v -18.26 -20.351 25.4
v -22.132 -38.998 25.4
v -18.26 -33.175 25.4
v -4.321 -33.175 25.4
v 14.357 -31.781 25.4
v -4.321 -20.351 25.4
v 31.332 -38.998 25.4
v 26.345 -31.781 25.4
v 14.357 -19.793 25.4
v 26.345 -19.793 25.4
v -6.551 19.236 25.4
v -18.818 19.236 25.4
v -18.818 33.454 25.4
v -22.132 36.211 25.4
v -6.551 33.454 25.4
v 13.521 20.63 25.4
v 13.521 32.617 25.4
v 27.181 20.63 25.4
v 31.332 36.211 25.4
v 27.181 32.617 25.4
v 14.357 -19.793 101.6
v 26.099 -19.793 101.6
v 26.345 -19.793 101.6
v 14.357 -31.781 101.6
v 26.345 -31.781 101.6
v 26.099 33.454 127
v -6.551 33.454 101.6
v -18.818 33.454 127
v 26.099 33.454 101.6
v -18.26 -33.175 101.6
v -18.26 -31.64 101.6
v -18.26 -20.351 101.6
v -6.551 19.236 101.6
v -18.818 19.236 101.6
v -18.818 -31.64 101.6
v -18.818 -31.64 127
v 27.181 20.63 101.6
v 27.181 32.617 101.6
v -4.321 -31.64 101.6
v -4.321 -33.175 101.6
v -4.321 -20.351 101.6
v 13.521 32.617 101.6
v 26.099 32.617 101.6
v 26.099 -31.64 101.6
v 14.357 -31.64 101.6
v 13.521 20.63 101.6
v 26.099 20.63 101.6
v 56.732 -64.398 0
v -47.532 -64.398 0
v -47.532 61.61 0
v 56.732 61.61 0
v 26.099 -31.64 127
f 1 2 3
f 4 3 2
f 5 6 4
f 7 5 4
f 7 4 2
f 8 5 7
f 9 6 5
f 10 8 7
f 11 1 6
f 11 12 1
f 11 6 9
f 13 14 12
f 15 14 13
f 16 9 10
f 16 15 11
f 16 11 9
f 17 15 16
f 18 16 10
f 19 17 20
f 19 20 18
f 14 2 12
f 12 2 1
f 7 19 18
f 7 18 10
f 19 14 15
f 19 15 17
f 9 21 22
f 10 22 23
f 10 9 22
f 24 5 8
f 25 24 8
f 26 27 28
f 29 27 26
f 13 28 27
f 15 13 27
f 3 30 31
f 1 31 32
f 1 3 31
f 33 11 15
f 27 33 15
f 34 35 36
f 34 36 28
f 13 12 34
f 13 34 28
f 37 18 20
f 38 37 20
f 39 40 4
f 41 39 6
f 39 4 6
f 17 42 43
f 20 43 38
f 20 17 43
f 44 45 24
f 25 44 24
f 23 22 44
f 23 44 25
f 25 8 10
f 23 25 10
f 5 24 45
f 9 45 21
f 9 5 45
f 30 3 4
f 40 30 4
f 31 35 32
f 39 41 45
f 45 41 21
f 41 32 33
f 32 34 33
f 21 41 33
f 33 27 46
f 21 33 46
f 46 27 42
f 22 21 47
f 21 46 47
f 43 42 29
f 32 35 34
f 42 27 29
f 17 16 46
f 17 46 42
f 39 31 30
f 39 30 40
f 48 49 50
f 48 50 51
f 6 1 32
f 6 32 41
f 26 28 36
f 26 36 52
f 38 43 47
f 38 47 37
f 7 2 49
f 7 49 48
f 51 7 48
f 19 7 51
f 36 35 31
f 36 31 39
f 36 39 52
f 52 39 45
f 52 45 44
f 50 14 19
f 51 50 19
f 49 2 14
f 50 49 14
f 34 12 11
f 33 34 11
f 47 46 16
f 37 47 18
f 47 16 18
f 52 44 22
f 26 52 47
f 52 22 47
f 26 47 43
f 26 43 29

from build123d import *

# Parameters (mm, degrees)
F0_W     = 104.2639054358
F0_H     = 126.0087862611
F1_DEPTH = 25.4
F2_SIZE  = 25.39999
F3_W     = 12.2663415968
F3_H     = 14.2178032547
F3_W_2   = 13.6602446437
F3_H_2   = 11.9875594974
F3_W_3   = 13.9390230179
F3_H_3   = 12.8239002079
F3_W_4   = 11.9875576347
F3_H_4   = 11.9875632226
F4_DEPTH = 76.2
F5_W     = 44.9166167527
F5_H     = 65.0939904153
F6_DEPTH = 25.4


# Not quite as in the source:
# - a fillet or chamfer is up to 0.001 mm smaller than in the source, because OpenCascade refuses the exact size


with BuildPart() as f1:
    # F0 (on Top) → F1 (new body)
    with BuildSketch(Plane.XY):
        with Locations((4.5998785645, -1.3939030468)):
            Rectangle(F0_W, F0_H)
    extrude(amount=F1_DEPTH)

    # F2 (size 25.4 in the source; OpenCascade refuses exactly that, so slightly less here)
    f2_edges = [f1.edges().sort_by_distance(p)[0] for p in [
        (-47.532074, -1.393903, 25.4),
        (4.599879, -64.398296, 25.4),
        (56.731831, -1.393903, 25.4),
        (4.599879, 61.61049, 25.4),
    ]]
    chamfer(f2_edges, length=F2_SIZE)

    # F3 (on face) → F4 (join)
    with BuildSketch(Plane.XY.offset(25.4)):
        with Locations((-12.6845128834, 26.3447565958)):
            Rectangle(F3_W, F3_H)
        with Locations((20.3509759158, 26.6235359013)):
            Rectangle(F3_W_2, F3_H_2)
        with Locations((-11.2906098366, -26.7629260197)):
            Rectangle(F3_W_3, F3_H_3)
        with Locations((20.3509749845, -25.7871951908)):
            Rectangle(F3_W_4, F3_H_4)
    extrude(amount=F4_DEPTH)

    # F5 (on face) → F6 (join)
    with BuildSketch(Plane.XY.offset(101.6)):
        with Locations((3.6406246945, 0.9066630155)):
            Rectangle(F5_W, F5_H)
    extrude(amount=F6_DEPTH)


solid = f1.part
